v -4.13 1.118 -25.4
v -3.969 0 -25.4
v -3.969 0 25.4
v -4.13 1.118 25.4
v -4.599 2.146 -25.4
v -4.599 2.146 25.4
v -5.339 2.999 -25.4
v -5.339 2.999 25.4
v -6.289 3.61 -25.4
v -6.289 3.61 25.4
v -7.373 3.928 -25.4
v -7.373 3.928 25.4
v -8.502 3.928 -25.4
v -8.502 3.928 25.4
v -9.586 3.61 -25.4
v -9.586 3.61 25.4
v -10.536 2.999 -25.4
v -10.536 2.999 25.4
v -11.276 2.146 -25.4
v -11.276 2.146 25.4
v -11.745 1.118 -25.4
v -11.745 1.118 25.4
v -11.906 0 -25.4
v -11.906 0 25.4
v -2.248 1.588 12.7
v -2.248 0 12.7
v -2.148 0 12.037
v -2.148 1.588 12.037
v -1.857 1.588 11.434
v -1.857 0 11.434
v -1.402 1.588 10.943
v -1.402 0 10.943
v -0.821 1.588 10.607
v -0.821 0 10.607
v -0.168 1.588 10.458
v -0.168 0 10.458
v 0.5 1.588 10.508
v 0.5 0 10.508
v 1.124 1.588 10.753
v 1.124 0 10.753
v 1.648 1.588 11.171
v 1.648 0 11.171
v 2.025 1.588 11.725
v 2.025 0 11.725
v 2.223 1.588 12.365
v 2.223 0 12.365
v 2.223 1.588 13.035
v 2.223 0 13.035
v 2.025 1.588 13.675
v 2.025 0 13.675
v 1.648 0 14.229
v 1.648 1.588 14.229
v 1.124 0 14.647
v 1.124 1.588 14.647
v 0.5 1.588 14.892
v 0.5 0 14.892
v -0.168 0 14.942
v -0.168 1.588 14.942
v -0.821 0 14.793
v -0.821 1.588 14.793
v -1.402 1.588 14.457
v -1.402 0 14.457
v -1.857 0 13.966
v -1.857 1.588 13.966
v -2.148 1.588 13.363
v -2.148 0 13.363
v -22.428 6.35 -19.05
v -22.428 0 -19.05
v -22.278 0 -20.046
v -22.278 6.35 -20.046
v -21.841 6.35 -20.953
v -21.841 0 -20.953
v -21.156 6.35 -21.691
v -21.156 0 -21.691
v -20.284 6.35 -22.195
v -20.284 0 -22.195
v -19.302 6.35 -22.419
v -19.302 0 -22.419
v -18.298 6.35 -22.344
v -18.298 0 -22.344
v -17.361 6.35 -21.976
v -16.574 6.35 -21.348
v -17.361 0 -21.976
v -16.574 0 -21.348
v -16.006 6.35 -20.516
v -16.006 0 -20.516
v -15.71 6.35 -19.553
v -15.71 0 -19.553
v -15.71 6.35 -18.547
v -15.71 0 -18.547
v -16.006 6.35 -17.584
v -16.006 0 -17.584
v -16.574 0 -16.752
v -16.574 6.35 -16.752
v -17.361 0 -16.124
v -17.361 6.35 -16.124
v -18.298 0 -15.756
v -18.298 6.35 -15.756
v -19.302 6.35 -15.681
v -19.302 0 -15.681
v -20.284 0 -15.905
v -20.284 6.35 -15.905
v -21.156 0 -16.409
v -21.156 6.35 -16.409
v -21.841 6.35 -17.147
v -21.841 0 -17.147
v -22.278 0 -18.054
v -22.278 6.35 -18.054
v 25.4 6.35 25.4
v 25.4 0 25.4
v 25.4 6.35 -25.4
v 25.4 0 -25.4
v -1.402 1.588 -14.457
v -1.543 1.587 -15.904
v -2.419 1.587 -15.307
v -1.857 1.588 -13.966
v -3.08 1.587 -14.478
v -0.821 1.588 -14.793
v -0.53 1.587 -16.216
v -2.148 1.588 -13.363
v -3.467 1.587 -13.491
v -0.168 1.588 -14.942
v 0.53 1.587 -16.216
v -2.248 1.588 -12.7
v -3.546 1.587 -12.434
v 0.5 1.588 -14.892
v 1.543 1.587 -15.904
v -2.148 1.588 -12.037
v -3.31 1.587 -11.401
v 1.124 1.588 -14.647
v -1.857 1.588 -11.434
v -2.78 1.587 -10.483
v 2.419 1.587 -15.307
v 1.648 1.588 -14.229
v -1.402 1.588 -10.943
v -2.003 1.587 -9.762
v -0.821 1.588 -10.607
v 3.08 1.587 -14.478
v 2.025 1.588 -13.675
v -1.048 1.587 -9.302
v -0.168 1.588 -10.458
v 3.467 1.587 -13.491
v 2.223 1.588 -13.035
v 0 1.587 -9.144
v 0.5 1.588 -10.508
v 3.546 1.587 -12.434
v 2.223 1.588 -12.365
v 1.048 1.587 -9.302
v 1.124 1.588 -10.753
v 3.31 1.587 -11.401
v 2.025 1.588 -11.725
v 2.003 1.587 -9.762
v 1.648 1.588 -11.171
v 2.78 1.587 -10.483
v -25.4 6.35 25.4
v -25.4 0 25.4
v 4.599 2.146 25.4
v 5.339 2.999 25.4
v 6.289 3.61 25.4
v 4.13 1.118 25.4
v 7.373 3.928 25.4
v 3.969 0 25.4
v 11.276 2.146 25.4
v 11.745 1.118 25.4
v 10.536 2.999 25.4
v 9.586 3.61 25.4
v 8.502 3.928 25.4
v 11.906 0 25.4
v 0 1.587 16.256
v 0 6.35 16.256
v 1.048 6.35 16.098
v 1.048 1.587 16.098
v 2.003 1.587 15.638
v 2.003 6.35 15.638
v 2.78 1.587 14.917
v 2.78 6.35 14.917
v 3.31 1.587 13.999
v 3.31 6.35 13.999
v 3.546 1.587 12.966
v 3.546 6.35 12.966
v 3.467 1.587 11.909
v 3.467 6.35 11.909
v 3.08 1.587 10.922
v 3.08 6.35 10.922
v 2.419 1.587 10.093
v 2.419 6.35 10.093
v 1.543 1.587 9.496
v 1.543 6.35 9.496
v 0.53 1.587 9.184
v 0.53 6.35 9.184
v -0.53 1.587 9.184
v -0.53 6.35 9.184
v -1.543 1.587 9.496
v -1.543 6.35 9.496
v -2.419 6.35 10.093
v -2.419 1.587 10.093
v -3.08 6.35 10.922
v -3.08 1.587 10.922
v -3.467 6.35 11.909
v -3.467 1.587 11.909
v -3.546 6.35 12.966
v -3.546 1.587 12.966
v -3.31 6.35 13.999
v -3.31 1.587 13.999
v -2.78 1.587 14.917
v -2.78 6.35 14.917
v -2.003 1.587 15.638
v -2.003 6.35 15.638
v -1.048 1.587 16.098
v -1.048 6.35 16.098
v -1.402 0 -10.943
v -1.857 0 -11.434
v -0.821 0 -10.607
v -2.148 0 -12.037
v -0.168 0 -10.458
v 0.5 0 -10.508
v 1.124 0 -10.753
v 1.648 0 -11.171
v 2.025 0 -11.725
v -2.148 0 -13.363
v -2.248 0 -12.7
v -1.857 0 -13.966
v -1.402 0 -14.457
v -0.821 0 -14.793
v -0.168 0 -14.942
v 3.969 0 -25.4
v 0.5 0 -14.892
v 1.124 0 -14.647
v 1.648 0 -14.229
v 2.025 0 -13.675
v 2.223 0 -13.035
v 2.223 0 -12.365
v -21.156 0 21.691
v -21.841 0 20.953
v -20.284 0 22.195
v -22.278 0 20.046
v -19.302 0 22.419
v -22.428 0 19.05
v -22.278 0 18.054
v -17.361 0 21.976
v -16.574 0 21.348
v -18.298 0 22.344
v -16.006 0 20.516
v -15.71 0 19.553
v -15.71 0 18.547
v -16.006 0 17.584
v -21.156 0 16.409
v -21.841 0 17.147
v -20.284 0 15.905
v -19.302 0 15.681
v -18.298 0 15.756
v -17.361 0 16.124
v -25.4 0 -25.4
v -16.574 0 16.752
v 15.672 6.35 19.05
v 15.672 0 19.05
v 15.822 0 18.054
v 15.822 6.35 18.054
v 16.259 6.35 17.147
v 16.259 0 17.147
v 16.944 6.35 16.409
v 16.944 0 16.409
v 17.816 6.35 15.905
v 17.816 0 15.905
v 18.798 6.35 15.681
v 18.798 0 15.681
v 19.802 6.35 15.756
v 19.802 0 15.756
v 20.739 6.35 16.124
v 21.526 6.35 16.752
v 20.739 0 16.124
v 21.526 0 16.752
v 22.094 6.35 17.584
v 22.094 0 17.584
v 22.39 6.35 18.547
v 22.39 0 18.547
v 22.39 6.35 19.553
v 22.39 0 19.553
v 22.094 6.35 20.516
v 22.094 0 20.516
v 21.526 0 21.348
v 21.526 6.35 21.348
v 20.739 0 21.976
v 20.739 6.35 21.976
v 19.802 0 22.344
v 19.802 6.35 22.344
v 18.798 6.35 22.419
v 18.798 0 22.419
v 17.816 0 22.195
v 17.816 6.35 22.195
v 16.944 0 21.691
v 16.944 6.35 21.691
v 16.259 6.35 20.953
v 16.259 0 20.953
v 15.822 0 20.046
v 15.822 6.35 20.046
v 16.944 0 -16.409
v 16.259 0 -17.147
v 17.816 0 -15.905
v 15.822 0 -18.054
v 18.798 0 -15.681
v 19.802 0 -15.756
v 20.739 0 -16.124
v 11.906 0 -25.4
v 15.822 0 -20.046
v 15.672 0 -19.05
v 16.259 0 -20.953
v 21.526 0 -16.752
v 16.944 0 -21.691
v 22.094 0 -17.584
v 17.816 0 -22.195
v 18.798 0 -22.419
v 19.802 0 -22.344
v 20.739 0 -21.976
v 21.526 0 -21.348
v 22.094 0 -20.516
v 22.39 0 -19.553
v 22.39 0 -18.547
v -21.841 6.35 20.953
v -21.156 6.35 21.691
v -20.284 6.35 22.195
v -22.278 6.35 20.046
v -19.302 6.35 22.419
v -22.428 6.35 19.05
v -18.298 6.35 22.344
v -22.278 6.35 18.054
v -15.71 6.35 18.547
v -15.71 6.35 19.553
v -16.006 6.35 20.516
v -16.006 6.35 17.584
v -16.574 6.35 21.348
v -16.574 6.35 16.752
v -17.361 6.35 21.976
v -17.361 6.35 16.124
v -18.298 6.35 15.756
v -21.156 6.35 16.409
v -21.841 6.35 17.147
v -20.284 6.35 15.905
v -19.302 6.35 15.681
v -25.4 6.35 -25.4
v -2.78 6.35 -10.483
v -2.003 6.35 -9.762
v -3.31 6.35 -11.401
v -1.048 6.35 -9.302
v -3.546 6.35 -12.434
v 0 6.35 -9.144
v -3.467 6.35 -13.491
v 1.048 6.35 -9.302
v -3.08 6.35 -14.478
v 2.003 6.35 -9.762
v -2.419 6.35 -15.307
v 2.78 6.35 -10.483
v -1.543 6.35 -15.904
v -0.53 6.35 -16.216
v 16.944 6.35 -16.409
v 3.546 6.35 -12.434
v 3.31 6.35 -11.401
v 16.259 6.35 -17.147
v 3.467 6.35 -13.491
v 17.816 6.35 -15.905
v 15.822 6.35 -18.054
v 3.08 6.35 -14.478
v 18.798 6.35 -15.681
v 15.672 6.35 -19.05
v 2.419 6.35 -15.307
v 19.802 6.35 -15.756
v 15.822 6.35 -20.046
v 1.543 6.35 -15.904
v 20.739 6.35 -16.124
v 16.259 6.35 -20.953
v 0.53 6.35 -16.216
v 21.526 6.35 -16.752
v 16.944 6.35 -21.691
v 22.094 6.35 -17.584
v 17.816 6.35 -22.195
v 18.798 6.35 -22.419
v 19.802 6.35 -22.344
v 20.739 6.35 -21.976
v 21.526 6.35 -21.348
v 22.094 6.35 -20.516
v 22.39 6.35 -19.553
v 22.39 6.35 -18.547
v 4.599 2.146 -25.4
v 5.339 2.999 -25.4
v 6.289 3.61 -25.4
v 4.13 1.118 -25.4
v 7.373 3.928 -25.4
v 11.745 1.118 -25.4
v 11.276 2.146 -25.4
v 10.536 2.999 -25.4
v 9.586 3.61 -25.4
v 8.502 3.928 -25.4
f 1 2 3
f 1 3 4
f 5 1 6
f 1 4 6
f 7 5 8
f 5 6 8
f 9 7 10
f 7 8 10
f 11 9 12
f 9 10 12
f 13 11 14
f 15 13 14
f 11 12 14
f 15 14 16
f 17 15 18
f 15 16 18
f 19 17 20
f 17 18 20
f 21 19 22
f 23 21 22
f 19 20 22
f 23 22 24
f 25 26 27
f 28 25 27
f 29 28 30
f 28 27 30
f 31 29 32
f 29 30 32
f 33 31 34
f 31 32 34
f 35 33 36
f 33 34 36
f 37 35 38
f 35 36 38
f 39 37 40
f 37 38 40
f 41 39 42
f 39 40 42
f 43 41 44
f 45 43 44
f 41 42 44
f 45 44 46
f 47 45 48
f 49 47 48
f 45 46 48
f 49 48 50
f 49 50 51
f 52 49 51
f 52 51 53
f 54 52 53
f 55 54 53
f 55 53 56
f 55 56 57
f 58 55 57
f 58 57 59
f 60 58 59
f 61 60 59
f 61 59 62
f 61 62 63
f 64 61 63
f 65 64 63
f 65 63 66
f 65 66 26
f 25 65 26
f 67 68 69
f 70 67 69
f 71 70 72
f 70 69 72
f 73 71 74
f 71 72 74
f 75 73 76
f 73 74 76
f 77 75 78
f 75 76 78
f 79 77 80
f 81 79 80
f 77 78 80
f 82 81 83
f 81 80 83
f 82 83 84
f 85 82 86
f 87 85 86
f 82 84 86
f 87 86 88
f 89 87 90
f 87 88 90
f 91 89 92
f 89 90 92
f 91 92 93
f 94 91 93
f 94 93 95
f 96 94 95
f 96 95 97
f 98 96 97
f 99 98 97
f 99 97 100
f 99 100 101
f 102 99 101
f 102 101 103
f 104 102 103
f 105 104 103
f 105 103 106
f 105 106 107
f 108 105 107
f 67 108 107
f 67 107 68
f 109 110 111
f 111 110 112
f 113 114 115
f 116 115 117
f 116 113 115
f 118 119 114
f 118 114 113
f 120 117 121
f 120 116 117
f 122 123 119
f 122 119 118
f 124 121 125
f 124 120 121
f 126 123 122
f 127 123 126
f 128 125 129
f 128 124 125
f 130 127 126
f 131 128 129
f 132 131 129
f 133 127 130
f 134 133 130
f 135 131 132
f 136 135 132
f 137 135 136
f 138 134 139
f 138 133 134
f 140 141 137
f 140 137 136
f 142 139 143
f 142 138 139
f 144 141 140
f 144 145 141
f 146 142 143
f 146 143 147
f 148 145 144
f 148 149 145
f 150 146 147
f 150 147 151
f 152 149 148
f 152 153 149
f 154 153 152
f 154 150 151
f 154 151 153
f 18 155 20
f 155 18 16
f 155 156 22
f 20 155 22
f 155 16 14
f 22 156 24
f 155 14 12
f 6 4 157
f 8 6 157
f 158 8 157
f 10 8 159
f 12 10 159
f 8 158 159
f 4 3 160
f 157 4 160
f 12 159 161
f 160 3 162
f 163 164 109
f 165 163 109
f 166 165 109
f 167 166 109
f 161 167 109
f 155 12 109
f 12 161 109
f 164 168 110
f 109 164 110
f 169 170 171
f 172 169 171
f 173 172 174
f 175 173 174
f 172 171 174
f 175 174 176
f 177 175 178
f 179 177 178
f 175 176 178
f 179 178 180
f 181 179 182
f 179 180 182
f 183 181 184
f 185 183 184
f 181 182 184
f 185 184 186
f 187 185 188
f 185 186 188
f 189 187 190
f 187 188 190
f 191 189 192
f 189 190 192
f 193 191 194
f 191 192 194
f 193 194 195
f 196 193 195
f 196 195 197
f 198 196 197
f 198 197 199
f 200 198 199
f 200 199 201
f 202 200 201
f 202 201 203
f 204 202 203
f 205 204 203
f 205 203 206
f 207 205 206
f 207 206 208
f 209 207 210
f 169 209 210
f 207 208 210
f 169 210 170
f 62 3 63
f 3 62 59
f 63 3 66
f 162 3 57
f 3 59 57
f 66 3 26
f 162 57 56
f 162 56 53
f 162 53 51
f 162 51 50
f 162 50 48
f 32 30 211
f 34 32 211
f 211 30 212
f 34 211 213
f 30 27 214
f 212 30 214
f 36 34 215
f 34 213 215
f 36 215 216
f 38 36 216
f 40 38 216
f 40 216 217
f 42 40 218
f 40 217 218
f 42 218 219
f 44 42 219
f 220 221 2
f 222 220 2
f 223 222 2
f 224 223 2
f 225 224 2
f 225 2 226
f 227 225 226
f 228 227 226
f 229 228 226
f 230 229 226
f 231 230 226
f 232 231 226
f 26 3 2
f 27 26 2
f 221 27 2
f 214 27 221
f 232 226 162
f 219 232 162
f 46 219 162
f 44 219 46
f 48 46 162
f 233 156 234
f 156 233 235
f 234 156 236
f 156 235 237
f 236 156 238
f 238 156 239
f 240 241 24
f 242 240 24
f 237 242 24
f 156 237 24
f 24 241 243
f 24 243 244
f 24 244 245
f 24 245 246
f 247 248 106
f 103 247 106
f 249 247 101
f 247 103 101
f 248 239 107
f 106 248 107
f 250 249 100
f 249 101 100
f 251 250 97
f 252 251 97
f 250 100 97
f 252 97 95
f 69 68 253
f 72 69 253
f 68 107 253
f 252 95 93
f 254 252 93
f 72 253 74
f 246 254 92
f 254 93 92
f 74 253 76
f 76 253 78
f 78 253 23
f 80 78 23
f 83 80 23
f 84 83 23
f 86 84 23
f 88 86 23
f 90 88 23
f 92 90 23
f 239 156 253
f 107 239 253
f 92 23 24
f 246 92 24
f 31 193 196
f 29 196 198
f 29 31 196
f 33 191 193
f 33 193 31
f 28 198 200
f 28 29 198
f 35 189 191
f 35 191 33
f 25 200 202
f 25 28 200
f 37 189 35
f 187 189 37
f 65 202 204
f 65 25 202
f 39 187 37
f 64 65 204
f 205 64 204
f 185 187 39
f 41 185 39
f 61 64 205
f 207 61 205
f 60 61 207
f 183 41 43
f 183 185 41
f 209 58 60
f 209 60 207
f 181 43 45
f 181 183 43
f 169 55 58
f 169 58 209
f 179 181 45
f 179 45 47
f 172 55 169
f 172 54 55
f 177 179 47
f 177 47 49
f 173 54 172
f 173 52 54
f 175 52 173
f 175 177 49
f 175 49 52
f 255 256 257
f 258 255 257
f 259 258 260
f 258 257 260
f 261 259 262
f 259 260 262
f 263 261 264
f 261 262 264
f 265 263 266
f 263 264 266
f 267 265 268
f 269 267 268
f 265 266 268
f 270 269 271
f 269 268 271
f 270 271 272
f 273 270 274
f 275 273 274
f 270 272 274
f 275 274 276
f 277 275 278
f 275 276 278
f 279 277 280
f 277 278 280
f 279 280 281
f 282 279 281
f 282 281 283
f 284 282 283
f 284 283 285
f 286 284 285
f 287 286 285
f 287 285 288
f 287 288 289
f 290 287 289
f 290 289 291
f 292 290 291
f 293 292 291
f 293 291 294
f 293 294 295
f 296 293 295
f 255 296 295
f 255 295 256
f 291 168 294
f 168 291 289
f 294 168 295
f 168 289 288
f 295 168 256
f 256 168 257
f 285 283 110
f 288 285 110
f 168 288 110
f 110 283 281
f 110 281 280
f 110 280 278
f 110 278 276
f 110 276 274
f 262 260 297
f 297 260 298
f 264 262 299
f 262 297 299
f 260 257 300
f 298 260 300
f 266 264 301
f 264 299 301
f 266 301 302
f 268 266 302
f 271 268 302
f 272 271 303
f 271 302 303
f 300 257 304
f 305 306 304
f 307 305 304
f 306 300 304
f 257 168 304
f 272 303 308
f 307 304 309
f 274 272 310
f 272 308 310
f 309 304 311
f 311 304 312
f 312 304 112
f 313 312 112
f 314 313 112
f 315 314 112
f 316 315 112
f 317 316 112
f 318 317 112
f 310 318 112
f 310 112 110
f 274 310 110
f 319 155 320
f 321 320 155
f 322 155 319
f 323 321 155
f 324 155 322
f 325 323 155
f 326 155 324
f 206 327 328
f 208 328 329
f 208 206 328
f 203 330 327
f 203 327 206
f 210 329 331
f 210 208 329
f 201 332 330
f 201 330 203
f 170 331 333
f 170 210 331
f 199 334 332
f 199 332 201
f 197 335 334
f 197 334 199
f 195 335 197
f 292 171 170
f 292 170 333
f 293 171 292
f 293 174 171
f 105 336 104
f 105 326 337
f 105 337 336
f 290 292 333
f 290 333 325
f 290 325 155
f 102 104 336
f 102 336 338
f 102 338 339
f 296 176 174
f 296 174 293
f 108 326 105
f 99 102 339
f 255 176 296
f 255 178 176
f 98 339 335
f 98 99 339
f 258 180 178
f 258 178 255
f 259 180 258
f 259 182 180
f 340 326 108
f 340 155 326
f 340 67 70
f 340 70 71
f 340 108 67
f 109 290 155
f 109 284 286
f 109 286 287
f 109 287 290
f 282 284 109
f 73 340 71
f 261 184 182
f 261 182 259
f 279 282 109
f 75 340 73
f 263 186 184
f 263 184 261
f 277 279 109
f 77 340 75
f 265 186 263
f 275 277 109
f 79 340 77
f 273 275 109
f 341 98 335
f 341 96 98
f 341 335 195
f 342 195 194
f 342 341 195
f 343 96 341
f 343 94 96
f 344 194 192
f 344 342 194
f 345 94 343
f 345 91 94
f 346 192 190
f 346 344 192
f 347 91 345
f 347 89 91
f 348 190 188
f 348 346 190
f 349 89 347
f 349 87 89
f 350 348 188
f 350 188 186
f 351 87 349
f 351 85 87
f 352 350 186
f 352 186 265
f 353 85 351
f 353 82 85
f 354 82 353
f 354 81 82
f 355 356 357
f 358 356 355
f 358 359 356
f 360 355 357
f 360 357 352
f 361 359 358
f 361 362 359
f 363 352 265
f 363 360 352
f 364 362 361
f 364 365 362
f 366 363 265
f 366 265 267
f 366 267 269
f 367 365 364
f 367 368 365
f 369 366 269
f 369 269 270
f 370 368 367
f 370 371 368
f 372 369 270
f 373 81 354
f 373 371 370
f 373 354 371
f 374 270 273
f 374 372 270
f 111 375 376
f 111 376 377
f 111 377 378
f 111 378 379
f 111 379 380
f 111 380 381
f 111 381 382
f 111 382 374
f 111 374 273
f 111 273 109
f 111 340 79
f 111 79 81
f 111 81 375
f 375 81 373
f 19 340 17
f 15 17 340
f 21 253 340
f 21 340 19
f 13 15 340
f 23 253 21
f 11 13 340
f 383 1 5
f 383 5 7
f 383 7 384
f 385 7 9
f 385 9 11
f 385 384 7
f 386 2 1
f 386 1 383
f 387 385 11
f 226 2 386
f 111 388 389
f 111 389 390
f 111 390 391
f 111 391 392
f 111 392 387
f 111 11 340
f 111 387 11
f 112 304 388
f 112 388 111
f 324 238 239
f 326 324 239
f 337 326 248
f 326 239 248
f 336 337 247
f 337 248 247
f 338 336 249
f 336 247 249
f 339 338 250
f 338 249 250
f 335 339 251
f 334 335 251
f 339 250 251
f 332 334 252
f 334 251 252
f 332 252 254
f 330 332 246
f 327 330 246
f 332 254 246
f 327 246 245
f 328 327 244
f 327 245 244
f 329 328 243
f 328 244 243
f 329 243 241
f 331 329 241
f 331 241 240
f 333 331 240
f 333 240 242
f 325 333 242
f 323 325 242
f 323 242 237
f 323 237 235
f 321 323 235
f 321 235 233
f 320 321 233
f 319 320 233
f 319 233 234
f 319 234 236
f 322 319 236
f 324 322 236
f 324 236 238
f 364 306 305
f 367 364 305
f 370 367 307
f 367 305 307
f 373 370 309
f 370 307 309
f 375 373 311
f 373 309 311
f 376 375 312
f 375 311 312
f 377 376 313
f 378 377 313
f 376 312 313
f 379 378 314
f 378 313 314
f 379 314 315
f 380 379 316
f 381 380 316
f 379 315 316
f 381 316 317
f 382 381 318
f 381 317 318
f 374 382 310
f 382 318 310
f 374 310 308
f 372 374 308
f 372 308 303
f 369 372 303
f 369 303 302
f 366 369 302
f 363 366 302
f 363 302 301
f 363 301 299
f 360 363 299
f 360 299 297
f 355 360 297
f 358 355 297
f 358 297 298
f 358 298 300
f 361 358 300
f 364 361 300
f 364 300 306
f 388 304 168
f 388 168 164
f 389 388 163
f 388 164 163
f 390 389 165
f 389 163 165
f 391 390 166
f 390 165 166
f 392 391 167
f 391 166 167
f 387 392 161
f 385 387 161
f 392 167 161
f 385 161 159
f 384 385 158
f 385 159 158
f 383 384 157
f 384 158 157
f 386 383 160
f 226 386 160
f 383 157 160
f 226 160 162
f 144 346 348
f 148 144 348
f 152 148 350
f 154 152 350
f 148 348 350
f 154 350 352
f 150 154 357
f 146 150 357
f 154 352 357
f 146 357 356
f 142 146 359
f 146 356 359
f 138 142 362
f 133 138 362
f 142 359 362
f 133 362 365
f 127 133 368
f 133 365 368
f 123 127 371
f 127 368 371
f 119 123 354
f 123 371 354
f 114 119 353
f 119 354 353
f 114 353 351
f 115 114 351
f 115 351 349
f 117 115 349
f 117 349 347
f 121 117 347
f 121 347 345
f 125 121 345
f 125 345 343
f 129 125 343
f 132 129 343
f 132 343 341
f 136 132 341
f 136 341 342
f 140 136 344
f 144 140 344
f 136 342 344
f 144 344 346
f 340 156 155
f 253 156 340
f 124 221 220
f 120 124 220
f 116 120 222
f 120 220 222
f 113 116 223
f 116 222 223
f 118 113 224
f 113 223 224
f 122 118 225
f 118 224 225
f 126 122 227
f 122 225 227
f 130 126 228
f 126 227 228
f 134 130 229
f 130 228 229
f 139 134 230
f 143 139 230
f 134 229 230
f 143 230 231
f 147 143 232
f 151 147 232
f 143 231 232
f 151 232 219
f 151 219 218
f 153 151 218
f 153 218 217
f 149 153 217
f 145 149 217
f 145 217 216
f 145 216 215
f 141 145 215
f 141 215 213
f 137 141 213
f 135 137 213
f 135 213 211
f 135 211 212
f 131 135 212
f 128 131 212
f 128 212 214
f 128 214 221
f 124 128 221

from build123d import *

# Parameters (mm, degrees)
SKETCH1_W               = 50.8
SKETCH1_H               = 50.8
BOSS_EXTRUDE1_DEPTH     = 6.35
SKETCH2_R               = 3.96875
CUT_EXTRUDE1_DEPTH      = 58.15
F_1_4_CLEARANCE_HOLE1_D = 6.7564
F_8_CLEARANCE_HOLE1_D   = 4.4958
SKETCH10_R              = 3.556
CUT_EXTRUDE2_DEPTH      = 4.7625


with BuildPart() as part:
    # Sketch1 → Boss-Extrude1 (new body)
    with BuildSketch(Plane(origin=(0, 0, 0), x_dir=(1, 0, 0), z_dir=(0, 1, 0))):
        Rectangle(SKETCH1_W, SKETCH1_H)
    extrude(amount=BOSS_EXTRUDE1_DEPTH)

    # Sketch2 → Cut-Extrude1 (cut, through all)
    with BuildSketch(Plane.XY.offset(25.4)):
        with Locations((-7.9375, 0)):
            Circle(SKETCH2_R)
        with Locations((7.9375, 0)):
            Circle(SKETCH2_R)
    extrude(amount=-CUT_EXTRUDE1_DEPTH, mode=Mode.SUBTRACT)

    # 1/4 Clearance Hole1 (through all)
    with Locations(Plane(origin=(0, 6.35, 0), x_dir=(1, 0, 0), z_dir=(0, 1, 0))):
        with Locations((-19.05, -19.05), (-19.05, 19.05), (19.05, 19.05), (19.05, -19.05)):
            Hole(F_1_4_CLEARANCE_HOLE1_D / 2)

    # #8 Clearance Hole1 (through all)
    with Locations(Plane(origin=(0, 6.35, 0), x_dir=(1, 0, 0), z_dir=(0, 1, 0))):
        with Locations((0, 12.7), (0, -12.7)):
            Hole(F_8_CLEARANCE_HOLE1_D / 2)

    # Sketch10 → Cut-Extrude2 (cut)
    with BuildSketch(Plane(origin=(0, 6.35, 0), x_dir=(1, 0, 0), z_dir=(0, 1, 0))):
        with Locations(Location((0, 12.7, 0), (0, 0, 270))):
            Circle(SKETCH10_R)
        with Locations(Location((0, -12.7, 0), (0, 0, 270))):
            Circle(SKETCH10_R)
    extrude(amount=-CUT_EXTRUDE2_DEPTH, mode=Mode.SUBTRACT)


solid = part.part
